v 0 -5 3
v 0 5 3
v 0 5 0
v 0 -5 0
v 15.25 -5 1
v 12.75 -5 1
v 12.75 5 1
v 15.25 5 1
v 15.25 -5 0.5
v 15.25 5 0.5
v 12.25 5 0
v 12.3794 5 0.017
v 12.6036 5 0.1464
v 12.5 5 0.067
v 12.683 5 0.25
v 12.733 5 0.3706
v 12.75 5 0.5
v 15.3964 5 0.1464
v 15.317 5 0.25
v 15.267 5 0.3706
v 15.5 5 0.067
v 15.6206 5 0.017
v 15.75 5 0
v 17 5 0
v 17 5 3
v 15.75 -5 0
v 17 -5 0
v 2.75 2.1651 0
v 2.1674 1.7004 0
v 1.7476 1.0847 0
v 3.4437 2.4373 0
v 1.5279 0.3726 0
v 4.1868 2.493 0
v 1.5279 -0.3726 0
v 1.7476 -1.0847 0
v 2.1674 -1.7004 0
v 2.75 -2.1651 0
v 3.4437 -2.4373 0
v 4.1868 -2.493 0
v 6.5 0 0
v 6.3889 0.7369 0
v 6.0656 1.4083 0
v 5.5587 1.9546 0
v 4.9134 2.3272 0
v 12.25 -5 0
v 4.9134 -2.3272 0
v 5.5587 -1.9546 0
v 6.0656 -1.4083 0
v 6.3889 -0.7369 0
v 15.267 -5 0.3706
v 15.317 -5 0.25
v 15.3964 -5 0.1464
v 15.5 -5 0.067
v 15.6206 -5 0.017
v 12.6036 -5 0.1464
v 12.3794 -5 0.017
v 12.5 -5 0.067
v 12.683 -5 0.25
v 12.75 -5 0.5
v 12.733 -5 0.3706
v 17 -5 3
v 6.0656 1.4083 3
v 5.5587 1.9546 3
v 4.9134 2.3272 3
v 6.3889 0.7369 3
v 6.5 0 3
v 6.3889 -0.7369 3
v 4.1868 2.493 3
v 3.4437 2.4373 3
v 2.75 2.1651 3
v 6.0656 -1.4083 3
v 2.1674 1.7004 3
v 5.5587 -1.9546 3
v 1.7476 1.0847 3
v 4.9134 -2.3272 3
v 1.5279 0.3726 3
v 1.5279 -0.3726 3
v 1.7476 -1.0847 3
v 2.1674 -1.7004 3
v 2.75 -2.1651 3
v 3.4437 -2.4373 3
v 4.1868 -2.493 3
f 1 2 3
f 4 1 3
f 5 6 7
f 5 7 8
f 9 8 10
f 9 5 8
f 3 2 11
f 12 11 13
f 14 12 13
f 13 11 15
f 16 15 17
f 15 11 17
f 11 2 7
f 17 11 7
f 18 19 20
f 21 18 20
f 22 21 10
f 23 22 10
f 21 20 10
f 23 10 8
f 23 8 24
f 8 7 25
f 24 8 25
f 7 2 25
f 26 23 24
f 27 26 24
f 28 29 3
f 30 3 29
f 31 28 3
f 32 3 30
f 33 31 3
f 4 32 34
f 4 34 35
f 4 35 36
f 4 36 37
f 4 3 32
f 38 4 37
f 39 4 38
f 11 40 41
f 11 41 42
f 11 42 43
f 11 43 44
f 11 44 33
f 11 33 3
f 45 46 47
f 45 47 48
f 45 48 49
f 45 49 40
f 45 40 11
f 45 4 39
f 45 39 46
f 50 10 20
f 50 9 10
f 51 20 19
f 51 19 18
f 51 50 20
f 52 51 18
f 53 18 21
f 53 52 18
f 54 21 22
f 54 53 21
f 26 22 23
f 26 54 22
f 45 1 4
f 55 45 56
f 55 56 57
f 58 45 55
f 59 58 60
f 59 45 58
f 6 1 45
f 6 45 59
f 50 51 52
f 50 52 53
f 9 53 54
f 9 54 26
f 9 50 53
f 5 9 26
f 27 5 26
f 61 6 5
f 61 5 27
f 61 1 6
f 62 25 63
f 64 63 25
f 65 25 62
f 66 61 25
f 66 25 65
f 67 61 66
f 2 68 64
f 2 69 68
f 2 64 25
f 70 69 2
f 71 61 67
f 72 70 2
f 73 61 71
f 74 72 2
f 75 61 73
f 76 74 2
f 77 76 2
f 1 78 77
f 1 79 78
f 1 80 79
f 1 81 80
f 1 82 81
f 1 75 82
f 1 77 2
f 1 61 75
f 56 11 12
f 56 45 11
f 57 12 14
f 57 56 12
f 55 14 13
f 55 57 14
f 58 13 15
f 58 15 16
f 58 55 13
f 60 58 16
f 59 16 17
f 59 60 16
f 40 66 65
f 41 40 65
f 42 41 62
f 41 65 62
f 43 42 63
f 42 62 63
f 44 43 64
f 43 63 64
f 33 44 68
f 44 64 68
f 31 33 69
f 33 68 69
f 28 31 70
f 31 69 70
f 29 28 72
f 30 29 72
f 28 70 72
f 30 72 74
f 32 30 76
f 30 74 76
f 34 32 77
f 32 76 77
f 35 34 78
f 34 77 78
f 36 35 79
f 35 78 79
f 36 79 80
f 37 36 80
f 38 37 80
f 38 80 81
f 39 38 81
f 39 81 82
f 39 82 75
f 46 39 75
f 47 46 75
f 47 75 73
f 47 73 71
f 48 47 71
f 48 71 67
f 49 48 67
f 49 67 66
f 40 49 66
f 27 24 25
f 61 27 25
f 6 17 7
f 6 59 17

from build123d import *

# Parameters (mm, degrees)
F1_DEPTH      = 5
F1_DEPTH_BACK = 5
F2_R          = 2.5
F3_DEPTH      = 3.001
F4_R          = 0.5


with BuildPart() as f1:
    # F0 (on Front) → F1 (new body, two sides)
    with BuildSketch(Plane.XZ) as f1_sk:
        Polygon((0, 3), (0, 0), (12.75, 0), (12.75, 1), (15.25, 1), (15.25, 0), (17, 0), (17, 3), align=None)
    extrude(amount=F1_DEPTH)
    extrude(f1_sk.sketch, amount=-F1_DEPTH_BACK)

    # F2 (on face) → F3 (cut, through all)
    with BuildSketch(Plane.XY.offset(3)):
        with Locations((4, 0)):
            Circle(F2_R)
    extrude(amount=-F3_DEPTH, mode=Mode.SUBTRACT)

    # F4
    f4_edges = [f1.edges().sort_by_distance(p)[0] for p in [
        (12.75, 0, 0),
        (15.25, 0, 0),
    ]]
    fillet(f4_edges, radius=F4_R)


solid = f1.part
